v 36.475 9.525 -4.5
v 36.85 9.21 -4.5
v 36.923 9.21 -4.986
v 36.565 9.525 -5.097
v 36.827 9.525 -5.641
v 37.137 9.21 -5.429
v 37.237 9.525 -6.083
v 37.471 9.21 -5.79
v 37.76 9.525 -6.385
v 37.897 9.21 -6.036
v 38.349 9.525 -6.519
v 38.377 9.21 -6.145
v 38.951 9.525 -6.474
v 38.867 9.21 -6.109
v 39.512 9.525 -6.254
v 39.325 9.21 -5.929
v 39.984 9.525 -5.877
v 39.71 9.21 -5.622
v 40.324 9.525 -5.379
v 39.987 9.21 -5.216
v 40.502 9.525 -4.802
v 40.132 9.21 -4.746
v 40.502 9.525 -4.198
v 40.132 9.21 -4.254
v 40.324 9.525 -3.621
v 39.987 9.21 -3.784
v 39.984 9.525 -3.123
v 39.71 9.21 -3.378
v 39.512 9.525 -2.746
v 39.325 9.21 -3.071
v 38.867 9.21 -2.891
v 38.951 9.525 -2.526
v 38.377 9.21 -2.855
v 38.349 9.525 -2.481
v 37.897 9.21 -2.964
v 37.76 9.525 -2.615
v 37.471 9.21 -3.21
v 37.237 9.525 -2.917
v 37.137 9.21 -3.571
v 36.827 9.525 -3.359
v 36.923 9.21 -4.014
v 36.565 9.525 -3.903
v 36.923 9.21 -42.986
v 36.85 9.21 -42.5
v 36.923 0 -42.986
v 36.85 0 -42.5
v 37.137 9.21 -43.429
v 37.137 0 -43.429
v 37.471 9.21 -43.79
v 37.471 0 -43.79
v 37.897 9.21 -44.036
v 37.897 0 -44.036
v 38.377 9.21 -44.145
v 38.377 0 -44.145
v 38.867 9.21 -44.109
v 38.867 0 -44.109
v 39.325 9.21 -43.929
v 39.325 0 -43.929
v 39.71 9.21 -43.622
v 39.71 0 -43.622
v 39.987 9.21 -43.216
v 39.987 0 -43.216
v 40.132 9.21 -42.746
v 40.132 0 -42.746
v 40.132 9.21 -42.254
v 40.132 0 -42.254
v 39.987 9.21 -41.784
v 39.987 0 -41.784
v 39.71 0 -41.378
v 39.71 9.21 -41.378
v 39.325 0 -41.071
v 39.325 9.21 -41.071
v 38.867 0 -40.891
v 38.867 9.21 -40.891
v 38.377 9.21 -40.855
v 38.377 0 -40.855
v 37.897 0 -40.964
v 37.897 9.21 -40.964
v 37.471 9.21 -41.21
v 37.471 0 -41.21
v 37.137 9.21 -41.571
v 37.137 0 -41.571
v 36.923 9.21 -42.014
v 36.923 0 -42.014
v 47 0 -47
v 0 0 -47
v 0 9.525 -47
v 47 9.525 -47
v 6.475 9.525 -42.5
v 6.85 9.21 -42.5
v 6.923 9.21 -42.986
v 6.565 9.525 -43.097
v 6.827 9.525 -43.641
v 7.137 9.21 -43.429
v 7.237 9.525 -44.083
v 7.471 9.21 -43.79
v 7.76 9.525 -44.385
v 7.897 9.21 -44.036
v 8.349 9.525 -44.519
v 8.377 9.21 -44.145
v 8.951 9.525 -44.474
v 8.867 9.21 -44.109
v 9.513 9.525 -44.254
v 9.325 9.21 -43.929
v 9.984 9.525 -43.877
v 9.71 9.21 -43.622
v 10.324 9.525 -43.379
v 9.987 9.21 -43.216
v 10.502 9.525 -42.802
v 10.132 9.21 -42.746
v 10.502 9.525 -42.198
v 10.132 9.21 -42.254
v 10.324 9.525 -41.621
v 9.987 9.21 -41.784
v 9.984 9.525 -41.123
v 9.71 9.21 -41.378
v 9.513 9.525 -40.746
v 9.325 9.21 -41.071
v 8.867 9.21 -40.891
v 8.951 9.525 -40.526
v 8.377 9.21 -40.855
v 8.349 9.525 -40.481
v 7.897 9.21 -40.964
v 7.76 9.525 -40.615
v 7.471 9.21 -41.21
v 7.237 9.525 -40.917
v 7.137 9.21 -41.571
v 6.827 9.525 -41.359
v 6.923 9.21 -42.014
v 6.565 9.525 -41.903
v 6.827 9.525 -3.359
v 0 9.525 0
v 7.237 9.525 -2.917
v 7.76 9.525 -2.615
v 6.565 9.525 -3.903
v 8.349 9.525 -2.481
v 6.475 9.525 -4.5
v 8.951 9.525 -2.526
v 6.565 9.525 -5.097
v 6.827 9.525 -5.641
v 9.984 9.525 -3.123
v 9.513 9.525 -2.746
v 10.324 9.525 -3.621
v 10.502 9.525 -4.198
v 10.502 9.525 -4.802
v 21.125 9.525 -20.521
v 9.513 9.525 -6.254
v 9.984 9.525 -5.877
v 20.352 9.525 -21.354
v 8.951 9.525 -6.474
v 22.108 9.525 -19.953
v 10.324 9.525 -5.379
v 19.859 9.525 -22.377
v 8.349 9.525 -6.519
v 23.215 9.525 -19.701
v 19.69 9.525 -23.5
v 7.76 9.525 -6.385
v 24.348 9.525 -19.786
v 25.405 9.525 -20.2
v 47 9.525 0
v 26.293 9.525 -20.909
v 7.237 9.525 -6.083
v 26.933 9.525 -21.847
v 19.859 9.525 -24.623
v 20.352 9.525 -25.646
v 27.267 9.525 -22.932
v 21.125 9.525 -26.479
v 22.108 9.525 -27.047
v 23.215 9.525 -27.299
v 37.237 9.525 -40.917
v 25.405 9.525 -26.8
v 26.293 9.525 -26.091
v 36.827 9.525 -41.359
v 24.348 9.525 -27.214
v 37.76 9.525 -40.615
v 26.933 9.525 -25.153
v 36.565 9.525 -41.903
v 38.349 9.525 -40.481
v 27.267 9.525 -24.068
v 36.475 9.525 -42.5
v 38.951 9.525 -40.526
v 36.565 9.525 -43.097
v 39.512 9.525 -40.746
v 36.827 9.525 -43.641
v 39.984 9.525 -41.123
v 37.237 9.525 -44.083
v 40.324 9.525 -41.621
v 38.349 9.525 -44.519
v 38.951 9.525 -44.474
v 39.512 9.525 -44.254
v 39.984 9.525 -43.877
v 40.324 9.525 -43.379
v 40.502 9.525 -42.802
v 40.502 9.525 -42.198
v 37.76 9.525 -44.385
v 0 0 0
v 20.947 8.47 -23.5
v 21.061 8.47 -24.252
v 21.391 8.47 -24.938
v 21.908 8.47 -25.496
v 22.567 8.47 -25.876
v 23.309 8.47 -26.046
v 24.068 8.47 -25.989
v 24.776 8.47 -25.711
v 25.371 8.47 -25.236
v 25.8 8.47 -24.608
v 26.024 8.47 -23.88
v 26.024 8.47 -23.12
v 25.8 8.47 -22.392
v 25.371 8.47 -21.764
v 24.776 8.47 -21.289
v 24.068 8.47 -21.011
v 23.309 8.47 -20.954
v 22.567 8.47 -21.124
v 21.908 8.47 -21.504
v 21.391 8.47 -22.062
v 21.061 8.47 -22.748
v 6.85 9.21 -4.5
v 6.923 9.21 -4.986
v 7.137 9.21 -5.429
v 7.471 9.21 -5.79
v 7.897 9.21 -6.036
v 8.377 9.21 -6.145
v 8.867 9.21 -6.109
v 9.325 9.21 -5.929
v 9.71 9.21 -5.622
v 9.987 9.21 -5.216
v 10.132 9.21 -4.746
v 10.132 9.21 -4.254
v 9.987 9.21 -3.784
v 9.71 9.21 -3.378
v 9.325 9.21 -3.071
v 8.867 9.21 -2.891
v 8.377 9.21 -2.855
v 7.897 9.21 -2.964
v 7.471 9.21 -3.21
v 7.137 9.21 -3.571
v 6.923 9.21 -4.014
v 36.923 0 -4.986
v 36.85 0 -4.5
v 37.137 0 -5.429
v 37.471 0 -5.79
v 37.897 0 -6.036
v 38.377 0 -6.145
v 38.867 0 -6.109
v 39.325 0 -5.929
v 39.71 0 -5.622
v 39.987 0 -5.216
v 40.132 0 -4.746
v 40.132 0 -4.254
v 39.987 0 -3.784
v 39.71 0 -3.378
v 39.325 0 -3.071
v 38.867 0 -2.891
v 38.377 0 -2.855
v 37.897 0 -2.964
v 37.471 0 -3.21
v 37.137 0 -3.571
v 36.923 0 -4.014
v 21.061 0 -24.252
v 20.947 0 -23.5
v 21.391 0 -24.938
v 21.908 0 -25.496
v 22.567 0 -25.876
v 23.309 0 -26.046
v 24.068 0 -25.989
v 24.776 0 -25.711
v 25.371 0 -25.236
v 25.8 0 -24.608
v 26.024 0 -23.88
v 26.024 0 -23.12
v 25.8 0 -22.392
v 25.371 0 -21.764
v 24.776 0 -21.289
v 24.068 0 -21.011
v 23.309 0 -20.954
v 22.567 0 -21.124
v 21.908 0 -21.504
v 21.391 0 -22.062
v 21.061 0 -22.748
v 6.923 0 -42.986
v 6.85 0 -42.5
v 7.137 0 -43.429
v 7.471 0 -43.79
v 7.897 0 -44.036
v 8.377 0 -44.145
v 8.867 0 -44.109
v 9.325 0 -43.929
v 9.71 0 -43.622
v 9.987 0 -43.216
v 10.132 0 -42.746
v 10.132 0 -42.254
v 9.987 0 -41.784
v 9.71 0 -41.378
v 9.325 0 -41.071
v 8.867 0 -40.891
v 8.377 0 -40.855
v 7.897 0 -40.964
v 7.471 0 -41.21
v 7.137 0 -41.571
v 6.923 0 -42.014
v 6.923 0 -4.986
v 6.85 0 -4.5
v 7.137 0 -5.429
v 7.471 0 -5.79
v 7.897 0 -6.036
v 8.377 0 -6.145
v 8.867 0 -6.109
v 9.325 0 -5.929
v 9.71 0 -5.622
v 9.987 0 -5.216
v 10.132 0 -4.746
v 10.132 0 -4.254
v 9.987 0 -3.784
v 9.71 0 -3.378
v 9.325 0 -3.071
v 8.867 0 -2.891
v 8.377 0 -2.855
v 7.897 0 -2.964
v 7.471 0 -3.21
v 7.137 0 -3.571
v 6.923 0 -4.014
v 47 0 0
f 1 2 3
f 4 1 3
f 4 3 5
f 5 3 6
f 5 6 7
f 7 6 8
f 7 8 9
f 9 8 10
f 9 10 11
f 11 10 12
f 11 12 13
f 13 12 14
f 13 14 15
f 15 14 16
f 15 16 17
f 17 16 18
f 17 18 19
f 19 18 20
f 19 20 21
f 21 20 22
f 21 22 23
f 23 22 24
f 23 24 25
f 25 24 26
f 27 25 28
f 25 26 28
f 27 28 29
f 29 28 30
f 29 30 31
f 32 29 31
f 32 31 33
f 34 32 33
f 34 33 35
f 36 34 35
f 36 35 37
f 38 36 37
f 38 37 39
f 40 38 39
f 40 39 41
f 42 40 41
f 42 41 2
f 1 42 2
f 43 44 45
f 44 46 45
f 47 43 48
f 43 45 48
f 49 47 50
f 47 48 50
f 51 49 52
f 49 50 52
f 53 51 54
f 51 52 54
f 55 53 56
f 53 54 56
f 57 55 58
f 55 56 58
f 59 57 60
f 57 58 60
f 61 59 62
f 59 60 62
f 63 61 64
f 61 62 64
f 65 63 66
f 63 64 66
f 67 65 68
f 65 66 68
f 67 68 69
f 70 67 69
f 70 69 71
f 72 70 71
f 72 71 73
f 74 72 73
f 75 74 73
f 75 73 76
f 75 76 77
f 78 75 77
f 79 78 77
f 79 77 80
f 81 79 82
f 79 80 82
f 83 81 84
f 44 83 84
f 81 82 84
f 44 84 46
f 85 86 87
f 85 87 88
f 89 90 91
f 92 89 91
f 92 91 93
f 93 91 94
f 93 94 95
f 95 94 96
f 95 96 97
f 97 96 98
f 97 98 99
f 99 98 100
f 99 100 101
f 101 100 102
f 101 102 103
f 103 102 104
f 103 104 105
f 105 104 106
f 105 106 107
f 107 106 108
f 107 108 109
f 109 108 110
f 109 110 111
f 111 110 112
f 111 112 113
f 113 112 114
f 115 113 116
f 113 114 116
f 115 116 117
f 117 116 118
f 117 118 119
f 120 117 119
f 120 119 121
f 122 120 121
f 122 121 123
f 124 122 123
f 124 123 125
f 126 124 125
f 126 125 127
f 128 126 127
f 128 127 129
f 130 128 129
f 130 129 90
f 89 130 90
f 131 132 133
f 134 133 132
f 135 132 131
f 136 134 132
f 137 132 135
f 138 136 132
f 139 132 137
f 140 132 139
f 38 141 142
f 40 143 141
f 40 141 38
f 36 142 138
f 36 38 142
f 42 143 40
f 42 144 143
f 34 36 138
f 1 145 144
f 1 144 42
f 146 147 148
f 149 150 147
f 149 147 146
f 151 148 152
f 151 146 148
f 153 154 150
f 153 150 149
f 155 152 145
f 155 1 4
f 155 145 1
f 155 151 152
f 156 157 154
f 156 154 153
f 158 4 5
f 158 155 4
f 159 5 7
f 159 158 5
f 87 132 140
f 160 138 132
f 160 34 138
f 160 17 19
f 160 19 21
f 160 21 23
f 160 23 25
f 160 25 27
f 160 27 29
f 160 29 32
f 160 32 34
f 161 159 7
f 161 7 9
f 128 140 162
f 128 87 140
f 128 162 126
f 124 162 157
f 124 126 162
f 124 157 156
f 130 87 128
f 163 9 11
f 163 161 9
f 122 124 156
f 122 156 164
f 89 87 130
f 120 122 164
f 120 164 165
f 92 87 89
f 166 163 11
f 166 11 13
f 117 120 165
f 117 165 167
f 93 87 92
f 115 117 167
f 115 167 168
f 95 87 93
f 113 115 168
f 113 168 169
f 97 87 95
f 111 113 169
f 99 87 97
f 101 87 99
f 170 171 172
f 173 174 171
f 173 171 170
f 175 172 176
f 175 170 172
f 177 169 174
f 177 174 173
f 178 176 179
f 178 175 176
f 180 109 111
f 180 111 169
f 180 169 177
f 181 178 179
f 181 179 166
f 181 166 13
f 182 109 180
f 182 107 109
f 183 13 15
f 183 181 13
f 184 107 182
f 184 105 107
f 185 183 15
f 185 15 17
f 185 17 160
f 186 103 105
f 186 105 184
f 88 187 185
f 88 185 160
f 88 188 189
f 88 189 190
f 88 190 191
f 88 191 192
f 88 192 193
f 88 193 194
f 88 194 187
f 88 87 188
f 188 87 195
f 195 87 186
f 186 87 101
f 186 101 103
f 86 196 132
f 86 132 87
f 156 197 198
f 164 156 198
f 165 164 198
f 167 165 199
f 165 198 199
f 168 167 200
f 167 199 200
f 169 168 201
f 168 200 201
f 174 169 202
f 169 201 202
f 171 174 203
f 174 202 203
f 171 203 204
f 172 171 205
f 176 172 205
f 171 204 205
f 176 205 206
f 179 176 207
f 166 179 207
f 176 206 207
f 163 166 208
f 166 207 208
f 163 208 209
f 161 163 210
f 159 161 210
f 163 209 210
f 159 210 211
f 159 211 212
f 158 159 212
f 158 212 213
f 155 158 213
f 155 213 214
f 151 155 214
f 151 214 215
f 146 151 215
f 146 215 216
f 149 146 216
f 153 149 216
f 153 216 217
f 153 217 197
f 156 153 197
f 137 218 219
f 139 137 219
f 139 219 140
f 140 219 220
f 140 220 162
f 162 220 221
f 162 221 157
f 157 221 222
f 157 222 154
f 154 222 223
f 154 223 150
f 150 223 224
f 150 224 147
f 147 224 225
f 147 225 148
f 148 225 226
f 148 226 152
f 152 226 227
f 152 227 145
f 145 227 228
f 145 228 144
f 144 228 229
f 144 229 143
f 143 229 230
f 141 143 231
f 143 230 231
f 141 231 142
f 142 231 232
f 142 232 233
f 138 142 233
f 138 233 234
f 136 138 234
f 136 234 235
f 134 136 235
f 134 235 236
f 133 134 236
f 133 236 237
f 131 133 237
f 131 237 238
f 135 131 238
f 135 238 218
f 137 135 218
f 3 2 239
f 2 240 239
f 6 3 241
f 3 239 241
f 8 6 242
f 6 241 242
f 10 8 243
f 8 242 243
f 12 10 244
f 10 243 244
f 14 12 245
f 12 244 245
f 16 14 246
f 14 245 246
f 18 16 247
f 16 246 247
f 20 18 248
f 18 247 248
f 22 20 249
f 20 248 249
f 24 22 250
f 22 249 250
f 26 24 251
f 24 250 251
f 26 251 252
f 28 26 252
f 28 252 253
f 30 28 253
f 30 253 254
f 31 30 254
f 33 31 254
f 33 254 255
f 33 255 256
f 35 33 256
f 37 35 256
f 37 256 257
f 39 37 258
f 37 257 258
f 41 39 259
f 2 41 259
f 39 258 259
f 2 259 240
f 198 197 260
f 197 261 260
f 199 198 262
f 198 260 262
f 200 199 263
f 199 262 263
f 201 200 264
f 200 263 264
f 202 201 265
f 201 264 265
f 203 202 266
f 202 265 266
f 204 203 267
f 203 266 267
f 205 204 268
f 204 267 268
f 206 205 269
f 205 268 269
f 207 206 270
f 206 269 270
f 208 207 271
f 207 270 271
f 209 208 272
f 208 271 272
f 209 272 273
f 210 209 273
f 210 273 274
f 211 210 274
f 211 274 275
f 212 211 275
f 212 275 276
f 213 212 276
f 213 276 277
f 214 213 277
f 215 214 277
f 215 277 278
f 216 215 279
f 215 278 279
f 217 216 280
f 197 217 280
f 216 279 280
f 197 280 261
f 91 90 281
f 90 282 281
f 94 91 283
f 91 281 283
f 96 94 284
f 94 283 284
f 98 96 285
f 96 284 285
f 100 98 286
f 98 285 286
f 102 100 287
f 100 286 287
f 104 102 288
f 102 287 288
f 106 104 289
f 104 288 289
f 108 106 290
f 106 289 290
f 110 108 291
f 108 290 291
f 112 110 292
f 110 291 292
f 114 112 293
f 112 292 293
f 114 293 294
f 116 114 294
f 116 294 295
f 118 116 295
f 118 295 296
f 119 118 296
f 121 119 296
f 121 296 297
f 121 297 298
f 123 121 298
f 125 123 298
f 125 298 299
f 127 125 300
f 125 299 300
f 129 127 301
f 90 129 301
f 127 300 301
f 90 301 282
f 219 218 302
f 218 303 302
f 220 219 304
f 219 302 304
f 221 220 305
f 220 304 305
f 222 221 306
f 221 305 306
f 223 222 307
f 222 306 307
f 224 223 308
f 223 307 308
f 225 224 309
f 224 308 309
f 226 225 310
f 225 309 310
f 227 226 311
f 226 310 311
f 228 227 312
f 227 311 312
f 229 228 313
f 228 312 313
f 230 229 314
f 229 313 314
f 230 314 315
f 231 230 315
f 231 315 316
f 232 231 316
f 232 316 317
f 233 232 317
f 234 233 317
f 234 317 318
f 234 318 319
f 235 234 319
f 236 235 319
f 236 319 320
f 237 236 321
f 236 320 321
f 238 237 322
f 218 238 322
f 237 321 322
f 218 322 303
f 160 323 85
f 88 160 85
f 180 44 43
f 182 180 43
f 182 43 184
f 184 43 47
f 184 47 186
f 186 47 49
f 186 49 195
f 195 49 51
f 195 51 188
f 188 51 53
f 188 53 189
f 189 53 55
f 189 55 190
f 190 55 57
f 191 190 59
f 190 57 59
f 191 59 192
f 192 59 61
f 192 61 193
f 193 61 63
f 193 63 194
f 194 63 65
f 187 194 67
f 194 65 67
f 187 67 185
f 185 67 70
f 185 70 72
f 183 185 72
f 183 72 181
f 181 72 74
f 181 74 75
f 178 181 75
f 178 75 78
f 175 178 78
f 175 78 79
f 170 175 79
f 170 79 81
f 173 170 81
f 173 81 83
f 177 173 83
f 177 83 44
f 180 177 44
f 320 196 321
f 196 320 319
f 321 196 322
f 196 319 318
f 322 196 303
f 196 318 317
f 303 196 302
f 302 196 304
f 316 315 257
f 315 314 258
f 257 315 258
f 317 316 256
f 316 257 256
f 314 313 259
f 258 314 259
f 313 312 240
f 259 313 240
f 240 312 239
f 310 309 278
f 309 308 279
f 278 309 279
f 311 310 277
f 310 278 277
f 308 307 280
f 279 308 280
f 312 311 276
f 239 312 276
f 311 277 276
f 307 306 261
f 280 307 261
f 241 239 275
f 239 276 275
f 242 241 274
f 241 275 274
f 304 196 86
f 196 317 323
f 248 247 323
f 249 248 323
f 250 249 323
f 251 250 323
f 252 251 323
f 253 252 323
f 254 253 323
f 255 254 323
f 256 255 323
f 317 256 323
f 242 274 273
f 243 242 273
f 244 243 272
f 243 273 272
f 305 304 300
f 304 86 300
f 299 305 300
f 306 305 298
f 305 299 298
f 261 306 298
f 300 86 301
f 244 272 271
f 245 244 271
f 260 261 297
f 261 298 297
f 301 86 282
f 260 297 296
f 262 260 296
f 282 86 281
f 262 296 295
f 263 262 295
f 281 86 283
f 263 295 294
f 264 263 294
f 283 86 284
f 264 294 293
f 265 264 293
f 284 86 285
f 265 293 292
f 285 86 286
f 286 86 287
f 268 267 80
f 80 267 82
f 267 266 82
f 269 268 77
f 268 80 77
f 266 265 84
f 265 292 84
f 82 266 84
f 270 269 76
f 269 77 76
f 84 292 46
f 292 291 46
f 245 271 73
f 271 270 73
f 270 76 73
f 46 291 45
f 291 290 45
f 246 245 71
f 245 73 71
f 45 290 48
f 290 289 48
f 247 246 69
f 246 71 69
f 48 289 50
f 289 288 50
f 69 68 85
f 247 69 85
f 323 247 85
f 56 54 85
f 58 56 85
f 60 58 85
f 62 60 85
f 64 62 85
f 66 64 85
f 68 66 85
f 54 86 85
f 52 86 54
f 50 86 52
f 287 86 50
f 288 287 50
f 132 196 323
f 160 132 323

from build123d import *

# Parameters (mm, degrees)
SKETCH1_W                         = 47
SKETCH1_H                         = 47
BOSS_EXTRUDE1_DEPTH               = 9.525
M4X0_7_TAPPED_HOLE1_D             = 3.3
M4X0_7_TAPPED_HOLE1_CSINK_D       = 4.05
M4X0_7_TAPPED_HOLE1_CSINK_ANGLE   = 100
F_1_4_20_TAPPED_HOLE1_D           = 5.1054
F_1_4_20_TAPPED_HOLE1_CSINK_D     = 7.62
F_1_4_20_TAPPED_HOLE1_CSINK_ANGLE = 100


with BuildPart() as part:
    # Sketch1 → Boss-Extrude1 (new body)
    with BuildSketch(Plane(origin=(0, 0, 0), x_dir=(1, 0, 0), z_dir=(0, 1, 0))):
        with Locations((23.5, 23.5)):
            Rectangle(SKETCH1_W, SKETCH1_H)
    extrude(amount=BOSS_EXTRUDE1_DEPTH)

    # M4x0.7 Tapped Hole1 (through all)
    with Locations(Plane(origin=(0, 9.525, 0), x_dir=(1, 0, 0), z_dir=(0, 1, 0))):
        with Locations((38.5, 42.5), (8.5, 42.5), (8.5, 4.5), (38.5, 4.5)):
            CounterSinkHole(M4X0_7_TAPPED_HOLE1_D / 2, M4X0_7_TAPPED_HOLE1_CSINK_D / 2, counter_sink_angle=M4X0_7_TAPPED_HOLE1_CSINK_ANGLE)

    # 1/4-20 Tapped Hole1 (through all)
    with Locations(Plane(origin=(0, 9.525, 0), x_dir=(1, 0, 0), z_dir=(0, 1, 0))):
        with Locations((23.5, 23.5)):
            CounterSinkHole(F_1_4_20_TAPPED_HOLE1_D / 2, F_1_4_20_TAPPED_HOLE1_CSINK_D / 2, counter_sink_angle=F_1_4_20_TAPPED_HOLE1_CSINK_ANGLE)


solid = part.part
